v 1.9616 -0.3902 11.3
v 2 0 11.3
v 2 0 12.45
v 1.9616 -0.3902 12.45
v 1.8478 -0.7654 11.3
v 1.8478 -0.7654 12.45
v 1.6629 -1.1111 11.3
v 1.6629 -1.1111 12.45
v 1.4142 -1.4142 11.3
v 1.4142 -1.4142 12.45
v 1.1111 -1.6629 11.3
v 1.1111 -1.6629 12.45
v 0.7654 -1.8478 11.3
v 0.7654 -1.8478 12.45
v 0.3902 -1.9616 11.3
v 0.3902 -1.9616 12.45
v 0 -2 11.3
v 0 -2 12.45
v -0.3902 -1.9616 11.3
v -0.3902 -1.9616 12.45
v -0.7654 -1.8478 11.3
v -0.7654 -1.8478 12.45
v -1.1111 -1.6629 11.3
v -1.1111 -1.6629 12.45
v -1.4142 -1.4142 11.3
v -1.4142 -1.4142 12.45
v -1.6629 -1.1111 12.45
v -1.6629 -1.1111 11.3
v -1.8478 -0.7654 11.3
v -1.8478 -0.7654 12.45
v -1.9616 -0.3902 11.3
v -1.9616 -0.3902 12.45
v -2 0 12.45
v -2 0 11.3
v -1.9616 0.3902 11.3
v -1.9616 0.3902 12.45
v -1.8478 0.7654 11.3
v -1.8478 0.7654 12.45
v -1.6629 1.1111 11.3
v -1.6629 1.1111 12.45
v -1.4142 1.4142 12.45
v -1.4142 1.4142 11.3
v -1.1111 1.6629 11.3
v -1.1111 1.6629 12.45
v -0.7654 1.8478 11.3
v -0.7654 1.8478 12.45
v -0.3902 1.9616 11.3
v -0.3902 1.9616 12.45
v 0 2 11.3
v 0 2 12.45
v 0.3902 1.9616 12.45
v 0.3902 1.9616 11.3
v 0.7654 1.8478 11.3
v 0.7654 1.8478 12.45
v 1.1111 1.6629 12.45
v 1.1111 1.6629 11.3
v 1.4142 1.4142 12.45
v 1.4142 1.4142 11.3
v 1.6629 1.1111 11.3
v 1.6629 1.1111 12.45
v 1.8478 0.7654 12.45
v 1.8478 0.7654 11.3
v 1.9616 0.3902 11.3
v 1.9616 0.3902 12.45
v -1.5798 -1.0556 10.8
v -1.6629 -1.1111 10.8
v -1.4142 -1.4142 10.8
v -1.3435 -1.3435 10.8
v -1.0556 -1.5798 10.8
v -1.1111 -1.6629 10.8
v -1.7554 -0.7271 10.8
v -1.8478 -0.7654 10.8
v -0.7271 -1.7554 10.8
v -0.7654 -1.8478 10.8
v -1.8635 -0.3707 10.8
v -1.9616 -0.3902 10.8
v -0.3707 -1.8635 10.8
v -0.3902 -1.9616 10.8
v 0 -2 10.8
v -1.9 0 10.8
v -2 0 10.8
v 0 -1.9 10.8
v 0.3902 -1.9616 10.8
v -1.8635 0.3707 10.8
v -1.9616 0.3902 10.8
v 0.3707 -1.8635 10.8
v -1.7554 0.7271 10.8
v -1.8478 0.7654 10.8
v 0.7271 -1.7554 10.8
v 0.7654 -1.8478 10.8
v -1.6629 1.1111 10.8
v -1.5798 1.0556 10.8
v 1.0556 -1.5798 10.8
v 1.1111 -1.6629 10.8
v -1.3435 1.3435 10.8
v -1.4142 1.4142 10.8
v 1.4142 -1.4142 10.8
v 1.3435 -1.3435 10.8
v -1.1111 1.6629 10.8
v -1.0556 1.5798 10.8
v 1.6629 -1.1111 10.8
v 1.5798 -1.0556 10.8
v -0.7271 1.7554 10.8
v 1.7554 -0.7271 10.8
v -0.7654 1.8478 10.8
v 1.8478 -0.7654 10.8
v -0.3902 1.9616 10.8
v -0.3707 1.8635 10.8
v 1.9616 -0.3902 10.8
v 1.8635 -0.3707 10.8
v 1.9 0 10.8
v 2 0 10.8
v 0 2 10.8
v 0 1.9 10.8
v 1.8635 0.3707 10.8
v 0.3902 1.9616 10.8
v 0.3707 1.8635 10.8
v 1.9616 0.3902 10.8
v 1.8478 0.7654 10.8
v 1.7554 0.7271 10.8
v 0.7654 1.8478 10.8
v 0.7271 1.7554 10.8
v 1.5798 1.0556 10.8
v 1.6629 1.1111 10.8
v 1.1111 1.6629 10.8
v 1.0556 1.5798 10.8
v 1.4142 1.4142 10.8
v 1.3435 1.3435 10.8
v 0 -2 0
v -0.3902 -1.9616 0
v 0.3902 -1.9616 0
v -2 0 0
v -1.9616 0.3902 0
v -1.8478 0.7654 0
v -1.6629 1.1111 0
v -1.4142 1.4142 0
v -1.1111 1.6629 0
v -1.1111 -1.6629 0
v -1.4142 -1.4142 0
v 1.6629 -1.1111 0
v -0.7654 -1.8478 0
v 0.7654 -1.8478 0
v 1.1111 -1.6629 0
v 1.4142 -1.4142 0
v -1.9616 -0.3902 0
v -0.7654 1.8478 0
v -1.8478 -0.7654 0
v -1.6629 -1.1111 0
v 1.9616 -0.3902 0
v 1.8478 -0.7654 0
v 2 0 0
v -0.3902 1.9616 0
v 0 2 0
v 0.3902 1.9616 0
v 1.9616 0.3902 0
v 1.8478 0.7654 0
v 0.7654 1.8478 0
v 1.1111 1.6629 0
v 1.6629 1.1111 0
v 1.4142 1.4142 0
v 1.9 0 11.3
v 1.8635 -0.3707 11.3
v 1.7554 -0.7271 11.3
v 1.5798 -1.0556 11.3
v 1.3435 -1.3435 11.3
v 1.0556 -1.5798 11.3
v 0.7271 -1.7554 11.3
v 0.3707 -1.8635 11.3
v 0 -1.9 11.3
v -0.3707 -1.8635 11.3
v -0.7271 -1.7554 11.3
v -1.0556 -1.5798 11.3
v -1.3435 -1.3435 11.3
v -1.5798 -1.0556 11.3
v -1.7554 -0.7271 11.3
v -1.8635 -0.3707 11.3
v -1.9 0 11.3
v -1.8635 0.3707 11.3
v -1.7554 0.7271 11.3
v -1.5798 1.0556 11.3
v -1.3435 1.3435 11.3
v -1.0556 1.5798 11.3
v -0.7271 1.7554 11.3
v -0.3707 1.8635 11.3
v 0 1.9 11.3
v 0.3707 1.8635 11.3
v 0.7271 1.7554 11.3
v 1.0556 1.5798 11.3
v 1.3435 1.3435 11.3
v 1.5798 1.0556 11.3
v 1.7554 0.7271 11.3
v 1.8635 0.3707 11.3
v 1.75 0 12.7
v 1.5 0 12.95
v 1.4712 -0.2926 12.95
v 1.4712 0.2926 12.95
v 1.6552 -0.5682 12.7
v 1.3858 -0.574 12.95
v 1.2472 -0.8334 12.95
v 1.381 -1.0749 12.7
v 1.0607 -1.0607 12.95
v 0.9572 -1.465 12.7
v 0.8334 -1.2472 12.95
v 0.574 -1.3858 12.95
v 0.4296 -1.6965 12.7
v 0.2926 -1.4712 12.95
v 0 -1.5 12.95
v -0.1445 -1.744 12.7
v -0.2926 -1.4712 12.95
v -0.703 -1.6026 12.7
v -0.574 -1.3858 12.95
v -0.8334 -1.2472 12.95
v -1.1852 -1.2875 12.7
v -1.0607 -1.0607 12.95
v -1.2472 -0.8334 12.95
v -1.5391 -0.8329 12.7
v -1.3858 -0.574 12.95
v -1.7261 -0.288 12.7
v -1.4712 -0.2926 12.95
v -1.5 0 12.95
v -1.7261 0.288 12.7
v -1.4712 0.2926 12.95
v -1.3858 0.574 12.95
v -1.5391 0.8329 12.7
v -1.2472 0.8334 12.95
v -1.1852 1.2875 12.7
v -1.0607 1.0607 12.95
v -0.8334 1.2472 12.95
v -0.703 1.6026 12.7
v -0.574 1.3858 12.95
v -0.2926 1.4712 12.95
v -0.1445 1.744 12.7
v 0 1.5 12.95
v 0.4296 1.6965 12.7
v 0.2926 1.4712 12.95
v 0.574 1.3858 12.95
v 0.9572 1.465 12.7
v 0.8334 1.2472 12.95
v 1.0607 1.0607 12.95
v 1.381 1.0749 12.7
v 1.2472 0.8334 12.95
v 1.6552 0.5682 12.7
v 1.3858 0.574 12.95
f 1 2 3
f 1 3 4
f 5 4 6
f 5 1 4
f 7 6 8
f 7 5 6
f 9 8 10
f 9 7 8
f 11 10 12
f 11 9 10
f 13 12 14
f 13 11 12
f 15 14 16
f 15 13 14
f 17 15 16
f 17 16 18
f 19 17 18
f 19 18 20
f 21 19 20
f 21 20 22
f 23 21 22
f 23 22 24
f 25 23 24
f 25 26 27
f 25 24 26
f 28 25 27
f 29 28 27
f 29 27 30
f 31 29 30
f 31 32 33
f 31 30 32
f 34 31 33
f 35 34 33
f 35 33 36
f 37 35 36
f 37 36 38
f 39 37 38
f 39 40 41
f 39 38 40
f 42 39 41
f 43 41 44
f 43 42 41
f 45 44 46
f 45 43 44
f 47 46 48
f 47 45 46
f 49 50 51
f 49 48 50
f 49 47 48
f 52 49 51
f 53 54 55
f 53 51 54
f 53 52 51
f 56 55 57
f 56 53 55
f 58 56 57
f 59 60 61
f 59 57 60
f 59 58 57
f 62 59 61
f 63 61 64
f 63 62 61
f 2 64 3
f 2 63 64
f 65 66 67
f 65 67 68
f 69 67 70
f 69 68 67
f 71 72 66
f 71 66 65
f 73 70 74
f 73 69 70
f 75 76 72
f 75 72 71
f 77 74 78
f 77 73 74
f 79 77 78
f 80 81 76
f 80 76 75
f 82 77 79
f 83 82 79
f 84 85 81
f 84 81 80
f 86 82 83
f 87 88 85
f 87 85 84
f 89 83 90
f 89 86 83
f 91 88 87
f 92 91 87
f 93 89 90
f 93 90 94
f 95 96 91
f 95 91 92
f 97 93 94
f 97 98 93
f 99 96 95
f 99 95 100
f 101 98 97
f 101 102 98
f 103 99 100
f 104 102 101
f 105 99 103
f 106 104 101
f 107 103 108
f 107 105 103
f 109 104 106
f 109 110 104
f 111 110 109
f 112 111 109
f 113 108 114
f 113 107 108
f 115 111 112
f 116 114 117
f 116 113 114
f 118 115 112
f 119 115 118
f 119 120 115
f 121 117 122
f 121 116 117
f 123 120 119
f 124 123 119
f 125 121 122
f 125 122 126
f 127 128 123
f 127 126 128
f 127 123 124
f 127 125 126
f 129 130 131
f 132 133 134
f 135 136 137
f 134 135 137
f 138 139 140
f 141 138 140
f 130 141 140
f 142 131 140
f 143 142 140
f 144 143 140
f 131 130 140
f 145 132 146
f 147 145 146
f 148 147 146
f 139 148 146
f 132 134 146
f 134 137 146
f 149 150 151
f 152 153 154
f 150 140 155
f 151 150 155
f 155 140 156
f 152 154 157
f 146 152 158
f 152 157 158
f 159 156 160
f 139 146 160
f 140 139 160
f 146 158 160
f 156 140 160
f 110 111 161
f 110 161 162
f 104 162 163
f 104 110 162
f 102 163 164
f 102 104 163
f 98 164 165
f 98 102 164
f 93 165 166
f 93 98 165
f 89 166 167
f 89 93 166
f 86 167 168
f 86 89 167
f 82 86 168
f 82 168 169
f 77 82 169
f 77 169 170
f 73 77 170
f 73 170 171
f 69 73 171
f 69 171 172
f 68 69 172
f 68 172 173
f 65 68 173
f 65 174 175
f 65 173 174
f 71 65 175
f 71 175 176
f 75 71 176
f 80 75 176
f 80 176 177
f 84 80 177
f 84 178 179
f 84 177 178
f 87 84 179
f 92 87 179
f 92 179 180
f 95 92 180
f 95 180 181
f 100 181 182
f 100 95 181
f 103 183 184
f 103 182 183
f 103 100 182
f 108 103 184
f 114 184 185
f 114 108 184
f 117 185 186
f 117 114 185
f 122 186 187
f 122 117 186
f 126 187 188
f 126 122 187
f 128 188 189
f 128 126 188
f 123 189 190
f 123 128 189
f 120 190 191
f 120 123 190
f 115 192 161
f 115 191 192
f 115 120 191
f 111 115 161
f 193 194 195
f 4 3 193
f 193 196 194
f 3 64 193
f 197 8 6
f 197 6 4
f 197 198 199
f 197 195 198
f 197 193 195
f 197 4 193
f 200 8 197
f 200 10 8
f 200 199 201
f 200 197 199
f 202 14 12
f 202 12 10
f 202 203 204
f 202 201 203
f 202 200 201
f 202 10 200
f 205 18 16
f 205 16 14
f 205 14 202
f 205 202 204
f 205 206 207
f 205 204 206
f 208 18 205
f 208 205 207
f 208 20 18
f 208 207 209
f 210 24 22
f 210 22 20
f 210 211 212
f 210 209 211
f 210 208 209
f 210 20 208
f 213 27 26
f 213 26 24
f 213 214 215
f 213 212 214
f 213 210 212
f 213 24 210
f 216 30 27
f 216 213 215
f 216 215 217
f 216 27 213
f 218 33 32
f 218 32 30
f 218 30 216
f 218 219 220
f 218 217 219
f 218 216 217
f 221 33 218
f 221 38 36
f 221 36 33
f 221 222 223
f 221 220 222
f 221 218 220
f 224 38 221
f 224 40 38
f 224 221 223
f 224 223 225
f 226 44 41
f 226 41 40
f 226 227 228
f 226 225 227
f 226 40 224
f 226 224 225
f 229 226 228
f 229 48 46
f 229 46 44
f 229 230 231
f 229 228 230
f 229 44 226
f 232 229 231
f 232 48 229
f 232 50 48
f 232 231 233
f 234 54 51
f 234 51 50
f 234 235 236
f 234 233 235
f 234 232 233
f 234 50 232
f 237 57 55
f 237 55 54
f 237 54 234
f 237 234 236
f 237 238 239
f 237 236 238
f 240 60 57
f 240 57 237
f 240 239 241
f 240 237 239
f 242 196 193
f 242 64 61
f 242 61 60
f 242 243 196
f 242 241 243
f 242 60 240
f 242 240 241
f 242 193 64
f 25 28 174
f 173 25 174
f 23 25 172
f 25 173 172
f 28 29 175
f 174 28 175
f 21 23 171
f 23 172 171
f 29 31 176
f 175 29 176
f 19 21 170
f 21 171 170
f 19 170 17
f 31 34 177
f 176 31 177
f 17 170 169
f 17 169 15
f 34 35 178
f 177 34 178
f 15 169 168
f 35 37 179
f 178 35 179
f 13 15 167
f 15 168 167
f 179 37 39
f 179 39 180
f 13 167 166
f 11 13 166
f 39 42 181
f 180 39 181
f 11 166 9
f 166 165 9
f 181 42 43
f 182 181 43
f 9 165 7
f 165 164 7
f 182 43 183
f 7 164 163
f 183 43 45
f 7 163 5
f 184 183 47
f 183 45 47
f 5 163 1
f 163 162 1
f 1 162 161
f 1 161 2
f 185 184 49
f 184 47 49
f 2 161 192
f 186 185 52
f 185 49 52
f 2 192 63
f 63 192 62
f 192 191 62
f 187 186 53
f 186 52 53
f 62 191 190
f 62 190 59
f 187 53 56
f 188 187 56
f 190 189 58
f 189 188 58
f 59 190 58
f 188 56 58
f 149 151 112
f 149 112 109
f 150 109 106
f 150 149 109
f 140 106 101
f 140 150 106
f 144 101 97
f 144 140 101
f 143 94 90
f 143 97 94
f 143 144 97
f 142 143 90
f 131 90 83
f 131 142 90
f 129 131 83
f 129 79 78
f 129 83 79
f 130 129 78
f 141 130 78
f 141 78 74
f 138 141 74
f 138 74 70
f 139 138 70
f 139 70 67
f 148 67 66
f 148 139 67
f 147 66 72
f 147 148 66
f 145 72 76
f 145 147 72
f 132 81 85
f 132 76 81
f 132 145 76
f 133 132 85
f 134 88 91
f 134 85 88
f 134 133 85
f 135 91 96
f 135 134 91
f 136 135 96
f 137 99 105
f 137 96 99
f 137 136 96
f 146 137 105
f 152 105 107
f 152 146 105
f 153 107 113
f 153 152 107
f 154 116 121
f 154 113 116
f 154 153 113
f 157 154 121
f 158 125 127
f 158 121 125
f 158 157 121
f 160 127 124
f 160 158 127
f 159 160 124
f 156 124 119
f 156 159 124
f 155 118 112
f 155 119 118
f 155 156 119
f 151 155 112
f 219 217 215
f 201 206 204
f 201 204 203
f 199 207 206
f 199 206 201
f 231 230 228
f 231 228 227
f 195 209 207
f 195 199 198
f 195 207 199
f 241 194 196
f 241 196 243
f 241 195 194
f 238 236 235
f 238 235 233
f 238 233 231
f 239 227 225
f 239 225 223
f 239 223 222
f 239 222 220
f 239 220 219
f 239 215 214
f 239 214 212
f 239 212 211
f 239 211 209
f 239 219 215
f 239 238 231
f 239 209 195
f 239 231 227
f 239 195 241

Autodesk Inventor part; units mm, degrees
ref_plane "YZ Plane" through (0, 0, 0) normal (1, 0, 0) x (0, 1, 0)
ref_plane "XZ Plane" through (0, 0, 0) normal (0, 1, 0) x (-1, 0, 0)
ref_plane "XY Plane" through (0, 0, 0) normal (0, 0, 1) x (1, 0, 0)
sketch "Sketch1" plane through (0, 0, 0) normal (0, 0, 1) x (1, 0, 0)
  circle A0 centre (0, 0) radius 2
  dimension "d0" = 4
extrude "Extrusion1" add sketch "Sketch1" along normal blind 10.8
sketch "Sketch2" plane through (0, 0, 10.8) normal (0, 0, 1) x (1, 0, 0)
  circle A0 centre (0, 0) radius 1.9
  dimension "d3" = 3.8
extrude "Extrusion2" add sketch "Sketch2" along normal blind 0.5
sketch "Sketch3" plane through (0, 0, 11.3) normal (0, 0, 1) x (1, 0, 0)
  circle A0 centre (0, 0) radius 2
extrude "Extrusion3" add sketch "Sketch3" along normal blind 1.65
chamfer "Chamfer1" distance 0.5 angle 45 1 edges at (-2, 0, 12.95)
properties part number "KURBELZAPFEN PART9" material "Steel ASTM A36"
